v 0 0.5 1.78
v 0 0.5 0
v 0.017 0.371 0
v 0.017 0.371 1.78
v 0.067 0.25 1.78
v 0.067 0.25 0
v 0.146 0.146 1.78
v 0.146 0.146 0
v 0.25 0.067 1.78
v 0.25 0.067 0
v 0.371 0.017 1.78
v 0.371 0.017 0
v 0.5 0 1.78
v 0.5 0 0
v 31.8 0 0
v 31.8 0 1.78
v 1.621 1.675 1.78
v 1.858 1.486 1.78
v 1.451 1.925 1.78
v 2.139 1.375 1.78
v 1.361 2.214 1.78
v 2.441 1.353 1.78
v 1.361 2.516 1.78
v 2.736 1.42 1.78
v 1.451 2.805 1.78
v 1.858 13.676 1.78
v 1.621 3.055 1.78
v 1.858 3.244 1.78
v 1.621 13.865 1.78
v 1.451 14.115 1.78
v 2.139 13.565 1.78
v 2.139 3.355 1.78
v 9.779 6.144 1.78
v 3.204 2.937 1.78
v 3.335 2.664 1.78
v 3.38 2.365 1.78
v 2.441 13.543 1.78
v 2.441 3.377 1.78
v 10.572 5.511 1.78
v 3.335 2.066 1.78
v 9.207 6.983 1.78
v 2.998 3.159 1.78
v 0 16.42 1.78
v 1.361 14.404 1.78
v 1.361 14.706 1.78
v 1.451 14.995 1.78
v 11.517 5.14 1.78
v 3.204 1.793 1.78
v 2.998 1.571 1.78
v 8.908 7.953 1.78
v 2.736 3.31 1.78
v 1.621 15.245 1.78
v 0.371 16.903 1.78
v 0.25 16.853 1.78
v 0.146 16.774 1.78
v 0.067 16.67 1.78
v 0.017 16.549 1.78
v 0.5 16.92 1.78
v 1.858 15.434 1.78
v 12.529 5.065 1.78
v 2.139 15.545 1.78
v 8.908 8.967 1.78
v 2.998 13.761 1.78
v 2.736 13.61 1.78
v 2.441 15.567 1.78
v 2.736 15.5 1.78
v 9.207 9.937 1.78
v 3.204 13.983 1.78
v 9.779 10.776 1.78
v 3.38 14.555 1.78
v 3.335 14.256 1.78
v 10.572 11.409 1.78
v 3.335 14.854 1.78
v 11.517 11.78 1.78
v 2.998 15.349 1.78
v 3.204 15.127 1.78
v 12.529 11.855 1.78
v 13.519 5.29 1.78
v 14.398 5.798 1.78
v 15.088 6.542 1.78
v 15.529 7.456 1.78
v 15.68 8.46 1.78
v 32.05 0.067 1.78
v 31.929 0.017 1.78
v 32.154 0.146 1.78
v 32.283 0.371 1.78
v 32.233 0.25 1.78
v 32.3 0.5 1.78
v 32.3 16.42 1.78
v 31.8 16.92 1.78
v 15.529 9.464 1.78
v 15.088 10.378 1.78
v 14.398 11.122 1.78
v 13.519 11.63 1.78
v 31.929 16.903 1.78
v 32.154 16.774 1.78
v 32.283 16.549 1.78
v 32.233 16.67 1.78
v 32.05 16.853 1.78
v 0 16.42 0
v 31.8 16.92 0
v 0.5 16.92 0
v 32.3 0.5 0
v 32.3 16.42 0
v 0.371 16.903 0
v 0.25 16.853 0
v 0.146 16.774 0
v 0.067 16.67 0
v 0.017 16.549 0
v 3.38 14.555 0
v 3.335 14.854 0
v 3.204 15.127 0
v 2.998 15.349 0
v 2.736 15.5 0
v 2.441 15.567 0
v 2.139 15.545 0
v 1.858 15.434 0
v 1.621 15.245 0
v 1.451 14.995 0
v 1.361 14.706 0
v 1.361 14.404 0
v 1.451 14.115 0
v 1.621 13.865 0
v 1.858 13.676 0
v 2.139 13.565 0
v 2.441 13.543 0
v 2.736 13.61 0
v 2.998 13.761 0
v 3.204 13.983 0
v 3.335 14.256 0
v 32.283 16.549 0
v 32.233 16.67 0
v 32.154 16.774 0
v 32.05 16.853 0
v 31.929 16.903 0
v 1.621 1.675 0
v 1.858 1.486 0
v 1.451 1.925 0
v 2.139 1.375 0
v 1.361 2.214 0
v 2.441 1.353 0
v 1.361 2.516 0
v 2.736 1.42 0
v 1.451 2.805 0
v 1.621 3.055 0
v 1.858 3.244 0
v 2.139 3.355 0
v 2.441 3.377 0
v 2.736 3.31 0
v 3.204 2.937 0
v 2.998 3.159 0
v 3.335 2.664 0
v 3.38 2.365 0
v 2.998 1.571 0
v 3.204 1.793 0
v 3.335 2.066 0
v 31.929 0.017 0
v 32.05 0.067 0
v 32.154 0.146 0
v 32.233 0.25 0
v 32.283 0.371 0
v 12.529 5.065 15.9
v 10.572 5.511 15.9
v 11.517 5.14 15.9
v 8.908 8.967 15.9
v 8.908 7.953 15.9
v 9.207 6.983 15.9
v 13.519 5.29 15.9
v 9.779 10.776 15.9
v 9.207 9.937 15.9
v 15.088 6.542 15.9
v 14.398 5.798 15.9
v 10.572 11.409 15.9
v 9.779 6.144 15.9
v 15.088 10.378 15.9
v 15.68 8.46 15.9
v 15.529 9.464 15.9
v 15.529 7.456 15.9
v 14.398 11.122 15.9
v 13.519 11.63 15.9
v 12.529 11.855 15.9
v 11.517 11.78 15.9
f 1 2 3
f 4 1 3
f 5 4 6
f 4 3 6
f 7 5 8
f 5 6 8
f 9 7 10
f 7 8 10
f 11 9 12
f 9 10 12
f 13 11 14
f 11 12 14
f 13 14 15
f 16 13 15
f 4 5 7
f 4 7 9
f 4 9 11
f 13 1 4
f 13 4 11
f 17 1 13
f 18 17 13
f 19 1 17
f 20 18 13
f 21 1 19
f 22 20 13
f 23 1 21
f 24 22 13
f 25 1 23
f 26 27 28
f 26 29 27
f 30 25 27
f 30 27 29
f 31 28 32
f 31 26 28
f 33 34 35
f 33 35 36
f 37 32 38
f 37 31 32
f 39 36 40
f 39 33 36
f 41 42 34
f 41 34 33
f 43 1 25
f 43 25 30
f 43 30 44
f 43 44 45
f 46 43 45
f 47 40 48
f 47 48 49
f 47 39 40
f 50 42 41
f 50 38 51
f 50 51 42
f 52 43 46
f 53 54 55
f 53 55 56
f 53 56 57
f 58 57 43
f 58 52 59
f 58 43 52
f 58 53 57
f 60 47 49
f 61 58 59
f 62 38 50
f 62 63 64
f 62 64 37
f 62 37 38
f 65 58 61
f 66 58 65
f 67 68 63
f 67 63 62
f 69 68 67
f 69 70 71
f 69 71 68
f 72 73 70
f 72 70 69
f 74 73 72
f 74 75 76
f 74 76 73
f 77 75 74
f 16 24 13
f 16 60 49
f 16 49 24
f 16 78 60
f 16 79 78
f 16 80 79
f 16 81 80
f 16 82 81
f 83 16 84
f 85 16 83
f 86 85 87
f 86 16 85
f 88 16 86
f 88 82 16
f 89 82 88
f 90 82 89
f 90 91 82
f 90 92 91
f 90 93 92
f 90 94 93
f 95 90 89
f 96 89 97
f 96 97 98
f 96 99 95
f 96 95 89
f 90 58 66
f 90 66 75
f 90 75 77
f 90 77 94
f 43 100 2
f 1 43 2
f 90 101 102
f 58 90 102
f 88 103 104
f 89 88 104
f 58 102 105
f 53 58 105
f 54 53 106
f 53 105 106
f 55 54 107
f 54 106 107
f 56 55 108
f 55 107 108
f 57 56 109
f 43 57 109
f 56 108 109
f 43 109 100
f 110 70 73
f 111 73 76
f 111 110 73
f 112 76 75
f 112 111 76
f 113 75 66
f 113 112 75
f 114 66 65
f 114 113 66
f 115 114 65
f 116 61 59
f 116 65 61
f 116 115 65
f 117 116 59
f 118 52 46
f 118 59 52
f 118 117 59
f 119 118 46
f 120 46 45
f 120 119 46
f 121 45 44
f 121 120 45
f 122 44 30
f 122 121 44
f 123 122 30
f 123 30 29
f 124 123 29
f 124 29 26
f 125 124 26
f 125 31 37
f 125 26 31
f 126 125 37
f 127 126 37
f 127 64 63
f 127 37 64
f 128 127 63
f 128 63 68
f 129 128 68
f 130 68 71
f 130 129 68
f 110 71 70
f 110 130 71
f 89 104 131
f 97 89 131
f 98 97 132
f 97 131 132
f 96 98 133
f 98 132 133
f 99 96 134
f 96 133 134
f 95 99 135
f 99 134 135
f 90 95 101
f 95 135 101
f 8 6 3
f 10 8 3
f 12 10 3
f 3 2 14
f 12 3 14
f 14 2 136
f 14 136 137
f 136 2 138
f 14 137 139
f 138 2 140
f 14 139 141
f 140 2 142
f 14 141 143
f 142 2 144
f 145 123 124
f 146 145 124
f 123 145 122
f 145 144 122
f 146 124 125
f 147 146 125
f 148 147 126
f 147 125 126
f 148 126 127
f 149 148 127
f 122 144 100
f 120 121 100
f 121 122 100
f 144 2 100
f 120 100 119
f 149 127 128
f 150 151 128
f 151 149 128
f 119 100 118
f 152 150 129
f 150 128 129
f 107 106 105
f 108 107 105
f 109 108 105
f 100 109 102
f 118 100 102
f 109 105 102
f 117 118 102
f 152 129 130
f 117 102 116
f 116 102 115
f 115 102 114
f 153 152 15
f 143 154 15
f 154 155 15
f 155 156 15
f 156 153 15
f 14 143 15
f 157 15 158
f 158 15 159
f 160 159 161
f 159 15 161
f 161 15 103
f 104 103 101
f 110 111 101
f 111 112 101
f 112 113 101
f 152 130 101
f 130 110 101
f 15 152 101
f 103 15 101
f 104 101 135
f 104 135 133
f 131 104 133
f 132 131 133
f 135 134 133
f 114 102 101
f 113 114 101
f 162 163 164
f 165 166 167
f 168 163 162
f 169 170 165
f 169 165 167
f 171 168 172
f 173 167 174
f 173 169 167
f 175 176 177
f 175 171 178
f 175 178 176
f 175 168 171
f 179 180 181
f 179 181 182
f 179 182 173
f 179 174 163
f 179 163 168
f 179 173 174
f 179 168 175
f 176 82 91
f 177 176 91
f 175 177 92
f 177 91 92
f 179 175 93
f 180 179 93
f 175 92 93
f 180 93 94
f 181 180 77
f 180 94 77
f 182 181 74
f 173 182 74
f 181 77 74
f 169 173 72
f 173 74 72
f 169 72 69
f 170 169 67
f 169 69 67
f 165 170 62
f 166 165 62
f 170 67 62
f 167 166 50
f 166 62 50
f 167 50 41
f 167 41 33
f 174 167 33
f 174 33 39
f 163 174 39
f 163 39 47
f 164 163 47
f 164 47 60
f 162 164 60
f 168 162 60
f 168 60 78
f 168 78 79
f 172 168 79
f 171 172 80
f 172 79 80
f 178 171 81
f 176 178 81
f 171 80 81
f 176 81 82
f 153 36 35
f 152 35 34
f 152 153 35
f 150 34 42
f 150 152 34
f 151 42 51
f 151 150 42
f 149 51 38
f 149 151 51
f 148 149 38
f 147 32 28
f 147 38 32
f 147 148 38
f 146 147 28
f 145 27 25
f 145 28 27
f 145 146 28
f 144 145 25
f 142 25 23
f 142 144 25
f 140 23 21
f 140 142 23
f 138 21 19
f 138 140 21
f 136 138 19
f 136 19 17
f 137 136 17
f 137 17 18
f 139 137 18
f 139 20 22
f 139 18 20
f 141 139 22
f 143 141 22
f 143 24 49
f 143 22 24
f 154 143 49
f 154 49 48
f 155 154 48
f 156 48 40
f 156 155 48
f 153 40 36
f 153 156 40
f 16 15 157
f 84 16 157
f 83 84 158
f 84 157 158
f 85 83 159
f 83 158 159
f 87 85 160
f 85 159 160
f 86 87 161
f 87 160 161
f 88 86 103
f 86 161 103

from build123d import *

# Parameters (mm, degrees)
MEASURED_ENCODER_PCB_DEPTH         = 1.78
SKETCH_2_R                         = 1.015
MEASURED_ENCODER_MOUNT_HOLES_DEPTH = 2
SHAFT_CLEARANCE_REFERENCE_START    = 1.78
SKETCH_3_R                         = 3.405
SHAFT_CLEARANCE_REFERENCE_DEPTH    = 14.12


with BuildPart() as part:
    # 草图1 → Measured_encoder_PCB (new body)
    with BuildSketch(Plane.XY):
        with BuildLine():
            Line((0.5, 0), (31.8, 0))
            ThreePointArc((31.8, 0), (32.153553391, 0.146446609), (32.3, 0.5))
            Line((32.3, 0.5), (32.3, 16.42))
            ThreePointArc((32.3, 16.42), (32.153553391, 16.773553391), (31.8, 16.92))
            Line((31.8, 16.92), (0.5, 16.92))
            ThreePointArc((0.5, 16.92), (0.146446609, 16.773553391), (0, 16.42))
            Line((0, 16.42), (0, 0.5))
            ThreePointArc((0, 0.5), (0.146446609, 0.146446609), (0.5, 0))
        make_face()
    extrude(amount=MEASURED_ENCODER_PCB_DEPTH)

    # 草图2 → Measured_encoder_mount_holes (cut)
    with BuildSketch(Plane.XY):
        with Locations((2.365, 2.365)):
            Circle(SKETCH_2_R)
        with Locations((2.365, 14.555)):
            Circle(SKETCH_2_R)
    extrude(amount=MEASURED_ENCODER_MOUNT_HOLES_DEPTH, mode=Mode.SUBTRACT)

    # 草图3 → Shaft_clearance_reference (add)
    with BuildSketch(Plane.XY.offset(SHAFT_CLEARANCE_REFERENCE_START)):
        with Locations((12.275, 8.46)):
            Circle(SKETCH_3_R)
    extrude(amount=SHAFT_CLEARANCE_REFERENCE_DEPTH)


solid = part.part
